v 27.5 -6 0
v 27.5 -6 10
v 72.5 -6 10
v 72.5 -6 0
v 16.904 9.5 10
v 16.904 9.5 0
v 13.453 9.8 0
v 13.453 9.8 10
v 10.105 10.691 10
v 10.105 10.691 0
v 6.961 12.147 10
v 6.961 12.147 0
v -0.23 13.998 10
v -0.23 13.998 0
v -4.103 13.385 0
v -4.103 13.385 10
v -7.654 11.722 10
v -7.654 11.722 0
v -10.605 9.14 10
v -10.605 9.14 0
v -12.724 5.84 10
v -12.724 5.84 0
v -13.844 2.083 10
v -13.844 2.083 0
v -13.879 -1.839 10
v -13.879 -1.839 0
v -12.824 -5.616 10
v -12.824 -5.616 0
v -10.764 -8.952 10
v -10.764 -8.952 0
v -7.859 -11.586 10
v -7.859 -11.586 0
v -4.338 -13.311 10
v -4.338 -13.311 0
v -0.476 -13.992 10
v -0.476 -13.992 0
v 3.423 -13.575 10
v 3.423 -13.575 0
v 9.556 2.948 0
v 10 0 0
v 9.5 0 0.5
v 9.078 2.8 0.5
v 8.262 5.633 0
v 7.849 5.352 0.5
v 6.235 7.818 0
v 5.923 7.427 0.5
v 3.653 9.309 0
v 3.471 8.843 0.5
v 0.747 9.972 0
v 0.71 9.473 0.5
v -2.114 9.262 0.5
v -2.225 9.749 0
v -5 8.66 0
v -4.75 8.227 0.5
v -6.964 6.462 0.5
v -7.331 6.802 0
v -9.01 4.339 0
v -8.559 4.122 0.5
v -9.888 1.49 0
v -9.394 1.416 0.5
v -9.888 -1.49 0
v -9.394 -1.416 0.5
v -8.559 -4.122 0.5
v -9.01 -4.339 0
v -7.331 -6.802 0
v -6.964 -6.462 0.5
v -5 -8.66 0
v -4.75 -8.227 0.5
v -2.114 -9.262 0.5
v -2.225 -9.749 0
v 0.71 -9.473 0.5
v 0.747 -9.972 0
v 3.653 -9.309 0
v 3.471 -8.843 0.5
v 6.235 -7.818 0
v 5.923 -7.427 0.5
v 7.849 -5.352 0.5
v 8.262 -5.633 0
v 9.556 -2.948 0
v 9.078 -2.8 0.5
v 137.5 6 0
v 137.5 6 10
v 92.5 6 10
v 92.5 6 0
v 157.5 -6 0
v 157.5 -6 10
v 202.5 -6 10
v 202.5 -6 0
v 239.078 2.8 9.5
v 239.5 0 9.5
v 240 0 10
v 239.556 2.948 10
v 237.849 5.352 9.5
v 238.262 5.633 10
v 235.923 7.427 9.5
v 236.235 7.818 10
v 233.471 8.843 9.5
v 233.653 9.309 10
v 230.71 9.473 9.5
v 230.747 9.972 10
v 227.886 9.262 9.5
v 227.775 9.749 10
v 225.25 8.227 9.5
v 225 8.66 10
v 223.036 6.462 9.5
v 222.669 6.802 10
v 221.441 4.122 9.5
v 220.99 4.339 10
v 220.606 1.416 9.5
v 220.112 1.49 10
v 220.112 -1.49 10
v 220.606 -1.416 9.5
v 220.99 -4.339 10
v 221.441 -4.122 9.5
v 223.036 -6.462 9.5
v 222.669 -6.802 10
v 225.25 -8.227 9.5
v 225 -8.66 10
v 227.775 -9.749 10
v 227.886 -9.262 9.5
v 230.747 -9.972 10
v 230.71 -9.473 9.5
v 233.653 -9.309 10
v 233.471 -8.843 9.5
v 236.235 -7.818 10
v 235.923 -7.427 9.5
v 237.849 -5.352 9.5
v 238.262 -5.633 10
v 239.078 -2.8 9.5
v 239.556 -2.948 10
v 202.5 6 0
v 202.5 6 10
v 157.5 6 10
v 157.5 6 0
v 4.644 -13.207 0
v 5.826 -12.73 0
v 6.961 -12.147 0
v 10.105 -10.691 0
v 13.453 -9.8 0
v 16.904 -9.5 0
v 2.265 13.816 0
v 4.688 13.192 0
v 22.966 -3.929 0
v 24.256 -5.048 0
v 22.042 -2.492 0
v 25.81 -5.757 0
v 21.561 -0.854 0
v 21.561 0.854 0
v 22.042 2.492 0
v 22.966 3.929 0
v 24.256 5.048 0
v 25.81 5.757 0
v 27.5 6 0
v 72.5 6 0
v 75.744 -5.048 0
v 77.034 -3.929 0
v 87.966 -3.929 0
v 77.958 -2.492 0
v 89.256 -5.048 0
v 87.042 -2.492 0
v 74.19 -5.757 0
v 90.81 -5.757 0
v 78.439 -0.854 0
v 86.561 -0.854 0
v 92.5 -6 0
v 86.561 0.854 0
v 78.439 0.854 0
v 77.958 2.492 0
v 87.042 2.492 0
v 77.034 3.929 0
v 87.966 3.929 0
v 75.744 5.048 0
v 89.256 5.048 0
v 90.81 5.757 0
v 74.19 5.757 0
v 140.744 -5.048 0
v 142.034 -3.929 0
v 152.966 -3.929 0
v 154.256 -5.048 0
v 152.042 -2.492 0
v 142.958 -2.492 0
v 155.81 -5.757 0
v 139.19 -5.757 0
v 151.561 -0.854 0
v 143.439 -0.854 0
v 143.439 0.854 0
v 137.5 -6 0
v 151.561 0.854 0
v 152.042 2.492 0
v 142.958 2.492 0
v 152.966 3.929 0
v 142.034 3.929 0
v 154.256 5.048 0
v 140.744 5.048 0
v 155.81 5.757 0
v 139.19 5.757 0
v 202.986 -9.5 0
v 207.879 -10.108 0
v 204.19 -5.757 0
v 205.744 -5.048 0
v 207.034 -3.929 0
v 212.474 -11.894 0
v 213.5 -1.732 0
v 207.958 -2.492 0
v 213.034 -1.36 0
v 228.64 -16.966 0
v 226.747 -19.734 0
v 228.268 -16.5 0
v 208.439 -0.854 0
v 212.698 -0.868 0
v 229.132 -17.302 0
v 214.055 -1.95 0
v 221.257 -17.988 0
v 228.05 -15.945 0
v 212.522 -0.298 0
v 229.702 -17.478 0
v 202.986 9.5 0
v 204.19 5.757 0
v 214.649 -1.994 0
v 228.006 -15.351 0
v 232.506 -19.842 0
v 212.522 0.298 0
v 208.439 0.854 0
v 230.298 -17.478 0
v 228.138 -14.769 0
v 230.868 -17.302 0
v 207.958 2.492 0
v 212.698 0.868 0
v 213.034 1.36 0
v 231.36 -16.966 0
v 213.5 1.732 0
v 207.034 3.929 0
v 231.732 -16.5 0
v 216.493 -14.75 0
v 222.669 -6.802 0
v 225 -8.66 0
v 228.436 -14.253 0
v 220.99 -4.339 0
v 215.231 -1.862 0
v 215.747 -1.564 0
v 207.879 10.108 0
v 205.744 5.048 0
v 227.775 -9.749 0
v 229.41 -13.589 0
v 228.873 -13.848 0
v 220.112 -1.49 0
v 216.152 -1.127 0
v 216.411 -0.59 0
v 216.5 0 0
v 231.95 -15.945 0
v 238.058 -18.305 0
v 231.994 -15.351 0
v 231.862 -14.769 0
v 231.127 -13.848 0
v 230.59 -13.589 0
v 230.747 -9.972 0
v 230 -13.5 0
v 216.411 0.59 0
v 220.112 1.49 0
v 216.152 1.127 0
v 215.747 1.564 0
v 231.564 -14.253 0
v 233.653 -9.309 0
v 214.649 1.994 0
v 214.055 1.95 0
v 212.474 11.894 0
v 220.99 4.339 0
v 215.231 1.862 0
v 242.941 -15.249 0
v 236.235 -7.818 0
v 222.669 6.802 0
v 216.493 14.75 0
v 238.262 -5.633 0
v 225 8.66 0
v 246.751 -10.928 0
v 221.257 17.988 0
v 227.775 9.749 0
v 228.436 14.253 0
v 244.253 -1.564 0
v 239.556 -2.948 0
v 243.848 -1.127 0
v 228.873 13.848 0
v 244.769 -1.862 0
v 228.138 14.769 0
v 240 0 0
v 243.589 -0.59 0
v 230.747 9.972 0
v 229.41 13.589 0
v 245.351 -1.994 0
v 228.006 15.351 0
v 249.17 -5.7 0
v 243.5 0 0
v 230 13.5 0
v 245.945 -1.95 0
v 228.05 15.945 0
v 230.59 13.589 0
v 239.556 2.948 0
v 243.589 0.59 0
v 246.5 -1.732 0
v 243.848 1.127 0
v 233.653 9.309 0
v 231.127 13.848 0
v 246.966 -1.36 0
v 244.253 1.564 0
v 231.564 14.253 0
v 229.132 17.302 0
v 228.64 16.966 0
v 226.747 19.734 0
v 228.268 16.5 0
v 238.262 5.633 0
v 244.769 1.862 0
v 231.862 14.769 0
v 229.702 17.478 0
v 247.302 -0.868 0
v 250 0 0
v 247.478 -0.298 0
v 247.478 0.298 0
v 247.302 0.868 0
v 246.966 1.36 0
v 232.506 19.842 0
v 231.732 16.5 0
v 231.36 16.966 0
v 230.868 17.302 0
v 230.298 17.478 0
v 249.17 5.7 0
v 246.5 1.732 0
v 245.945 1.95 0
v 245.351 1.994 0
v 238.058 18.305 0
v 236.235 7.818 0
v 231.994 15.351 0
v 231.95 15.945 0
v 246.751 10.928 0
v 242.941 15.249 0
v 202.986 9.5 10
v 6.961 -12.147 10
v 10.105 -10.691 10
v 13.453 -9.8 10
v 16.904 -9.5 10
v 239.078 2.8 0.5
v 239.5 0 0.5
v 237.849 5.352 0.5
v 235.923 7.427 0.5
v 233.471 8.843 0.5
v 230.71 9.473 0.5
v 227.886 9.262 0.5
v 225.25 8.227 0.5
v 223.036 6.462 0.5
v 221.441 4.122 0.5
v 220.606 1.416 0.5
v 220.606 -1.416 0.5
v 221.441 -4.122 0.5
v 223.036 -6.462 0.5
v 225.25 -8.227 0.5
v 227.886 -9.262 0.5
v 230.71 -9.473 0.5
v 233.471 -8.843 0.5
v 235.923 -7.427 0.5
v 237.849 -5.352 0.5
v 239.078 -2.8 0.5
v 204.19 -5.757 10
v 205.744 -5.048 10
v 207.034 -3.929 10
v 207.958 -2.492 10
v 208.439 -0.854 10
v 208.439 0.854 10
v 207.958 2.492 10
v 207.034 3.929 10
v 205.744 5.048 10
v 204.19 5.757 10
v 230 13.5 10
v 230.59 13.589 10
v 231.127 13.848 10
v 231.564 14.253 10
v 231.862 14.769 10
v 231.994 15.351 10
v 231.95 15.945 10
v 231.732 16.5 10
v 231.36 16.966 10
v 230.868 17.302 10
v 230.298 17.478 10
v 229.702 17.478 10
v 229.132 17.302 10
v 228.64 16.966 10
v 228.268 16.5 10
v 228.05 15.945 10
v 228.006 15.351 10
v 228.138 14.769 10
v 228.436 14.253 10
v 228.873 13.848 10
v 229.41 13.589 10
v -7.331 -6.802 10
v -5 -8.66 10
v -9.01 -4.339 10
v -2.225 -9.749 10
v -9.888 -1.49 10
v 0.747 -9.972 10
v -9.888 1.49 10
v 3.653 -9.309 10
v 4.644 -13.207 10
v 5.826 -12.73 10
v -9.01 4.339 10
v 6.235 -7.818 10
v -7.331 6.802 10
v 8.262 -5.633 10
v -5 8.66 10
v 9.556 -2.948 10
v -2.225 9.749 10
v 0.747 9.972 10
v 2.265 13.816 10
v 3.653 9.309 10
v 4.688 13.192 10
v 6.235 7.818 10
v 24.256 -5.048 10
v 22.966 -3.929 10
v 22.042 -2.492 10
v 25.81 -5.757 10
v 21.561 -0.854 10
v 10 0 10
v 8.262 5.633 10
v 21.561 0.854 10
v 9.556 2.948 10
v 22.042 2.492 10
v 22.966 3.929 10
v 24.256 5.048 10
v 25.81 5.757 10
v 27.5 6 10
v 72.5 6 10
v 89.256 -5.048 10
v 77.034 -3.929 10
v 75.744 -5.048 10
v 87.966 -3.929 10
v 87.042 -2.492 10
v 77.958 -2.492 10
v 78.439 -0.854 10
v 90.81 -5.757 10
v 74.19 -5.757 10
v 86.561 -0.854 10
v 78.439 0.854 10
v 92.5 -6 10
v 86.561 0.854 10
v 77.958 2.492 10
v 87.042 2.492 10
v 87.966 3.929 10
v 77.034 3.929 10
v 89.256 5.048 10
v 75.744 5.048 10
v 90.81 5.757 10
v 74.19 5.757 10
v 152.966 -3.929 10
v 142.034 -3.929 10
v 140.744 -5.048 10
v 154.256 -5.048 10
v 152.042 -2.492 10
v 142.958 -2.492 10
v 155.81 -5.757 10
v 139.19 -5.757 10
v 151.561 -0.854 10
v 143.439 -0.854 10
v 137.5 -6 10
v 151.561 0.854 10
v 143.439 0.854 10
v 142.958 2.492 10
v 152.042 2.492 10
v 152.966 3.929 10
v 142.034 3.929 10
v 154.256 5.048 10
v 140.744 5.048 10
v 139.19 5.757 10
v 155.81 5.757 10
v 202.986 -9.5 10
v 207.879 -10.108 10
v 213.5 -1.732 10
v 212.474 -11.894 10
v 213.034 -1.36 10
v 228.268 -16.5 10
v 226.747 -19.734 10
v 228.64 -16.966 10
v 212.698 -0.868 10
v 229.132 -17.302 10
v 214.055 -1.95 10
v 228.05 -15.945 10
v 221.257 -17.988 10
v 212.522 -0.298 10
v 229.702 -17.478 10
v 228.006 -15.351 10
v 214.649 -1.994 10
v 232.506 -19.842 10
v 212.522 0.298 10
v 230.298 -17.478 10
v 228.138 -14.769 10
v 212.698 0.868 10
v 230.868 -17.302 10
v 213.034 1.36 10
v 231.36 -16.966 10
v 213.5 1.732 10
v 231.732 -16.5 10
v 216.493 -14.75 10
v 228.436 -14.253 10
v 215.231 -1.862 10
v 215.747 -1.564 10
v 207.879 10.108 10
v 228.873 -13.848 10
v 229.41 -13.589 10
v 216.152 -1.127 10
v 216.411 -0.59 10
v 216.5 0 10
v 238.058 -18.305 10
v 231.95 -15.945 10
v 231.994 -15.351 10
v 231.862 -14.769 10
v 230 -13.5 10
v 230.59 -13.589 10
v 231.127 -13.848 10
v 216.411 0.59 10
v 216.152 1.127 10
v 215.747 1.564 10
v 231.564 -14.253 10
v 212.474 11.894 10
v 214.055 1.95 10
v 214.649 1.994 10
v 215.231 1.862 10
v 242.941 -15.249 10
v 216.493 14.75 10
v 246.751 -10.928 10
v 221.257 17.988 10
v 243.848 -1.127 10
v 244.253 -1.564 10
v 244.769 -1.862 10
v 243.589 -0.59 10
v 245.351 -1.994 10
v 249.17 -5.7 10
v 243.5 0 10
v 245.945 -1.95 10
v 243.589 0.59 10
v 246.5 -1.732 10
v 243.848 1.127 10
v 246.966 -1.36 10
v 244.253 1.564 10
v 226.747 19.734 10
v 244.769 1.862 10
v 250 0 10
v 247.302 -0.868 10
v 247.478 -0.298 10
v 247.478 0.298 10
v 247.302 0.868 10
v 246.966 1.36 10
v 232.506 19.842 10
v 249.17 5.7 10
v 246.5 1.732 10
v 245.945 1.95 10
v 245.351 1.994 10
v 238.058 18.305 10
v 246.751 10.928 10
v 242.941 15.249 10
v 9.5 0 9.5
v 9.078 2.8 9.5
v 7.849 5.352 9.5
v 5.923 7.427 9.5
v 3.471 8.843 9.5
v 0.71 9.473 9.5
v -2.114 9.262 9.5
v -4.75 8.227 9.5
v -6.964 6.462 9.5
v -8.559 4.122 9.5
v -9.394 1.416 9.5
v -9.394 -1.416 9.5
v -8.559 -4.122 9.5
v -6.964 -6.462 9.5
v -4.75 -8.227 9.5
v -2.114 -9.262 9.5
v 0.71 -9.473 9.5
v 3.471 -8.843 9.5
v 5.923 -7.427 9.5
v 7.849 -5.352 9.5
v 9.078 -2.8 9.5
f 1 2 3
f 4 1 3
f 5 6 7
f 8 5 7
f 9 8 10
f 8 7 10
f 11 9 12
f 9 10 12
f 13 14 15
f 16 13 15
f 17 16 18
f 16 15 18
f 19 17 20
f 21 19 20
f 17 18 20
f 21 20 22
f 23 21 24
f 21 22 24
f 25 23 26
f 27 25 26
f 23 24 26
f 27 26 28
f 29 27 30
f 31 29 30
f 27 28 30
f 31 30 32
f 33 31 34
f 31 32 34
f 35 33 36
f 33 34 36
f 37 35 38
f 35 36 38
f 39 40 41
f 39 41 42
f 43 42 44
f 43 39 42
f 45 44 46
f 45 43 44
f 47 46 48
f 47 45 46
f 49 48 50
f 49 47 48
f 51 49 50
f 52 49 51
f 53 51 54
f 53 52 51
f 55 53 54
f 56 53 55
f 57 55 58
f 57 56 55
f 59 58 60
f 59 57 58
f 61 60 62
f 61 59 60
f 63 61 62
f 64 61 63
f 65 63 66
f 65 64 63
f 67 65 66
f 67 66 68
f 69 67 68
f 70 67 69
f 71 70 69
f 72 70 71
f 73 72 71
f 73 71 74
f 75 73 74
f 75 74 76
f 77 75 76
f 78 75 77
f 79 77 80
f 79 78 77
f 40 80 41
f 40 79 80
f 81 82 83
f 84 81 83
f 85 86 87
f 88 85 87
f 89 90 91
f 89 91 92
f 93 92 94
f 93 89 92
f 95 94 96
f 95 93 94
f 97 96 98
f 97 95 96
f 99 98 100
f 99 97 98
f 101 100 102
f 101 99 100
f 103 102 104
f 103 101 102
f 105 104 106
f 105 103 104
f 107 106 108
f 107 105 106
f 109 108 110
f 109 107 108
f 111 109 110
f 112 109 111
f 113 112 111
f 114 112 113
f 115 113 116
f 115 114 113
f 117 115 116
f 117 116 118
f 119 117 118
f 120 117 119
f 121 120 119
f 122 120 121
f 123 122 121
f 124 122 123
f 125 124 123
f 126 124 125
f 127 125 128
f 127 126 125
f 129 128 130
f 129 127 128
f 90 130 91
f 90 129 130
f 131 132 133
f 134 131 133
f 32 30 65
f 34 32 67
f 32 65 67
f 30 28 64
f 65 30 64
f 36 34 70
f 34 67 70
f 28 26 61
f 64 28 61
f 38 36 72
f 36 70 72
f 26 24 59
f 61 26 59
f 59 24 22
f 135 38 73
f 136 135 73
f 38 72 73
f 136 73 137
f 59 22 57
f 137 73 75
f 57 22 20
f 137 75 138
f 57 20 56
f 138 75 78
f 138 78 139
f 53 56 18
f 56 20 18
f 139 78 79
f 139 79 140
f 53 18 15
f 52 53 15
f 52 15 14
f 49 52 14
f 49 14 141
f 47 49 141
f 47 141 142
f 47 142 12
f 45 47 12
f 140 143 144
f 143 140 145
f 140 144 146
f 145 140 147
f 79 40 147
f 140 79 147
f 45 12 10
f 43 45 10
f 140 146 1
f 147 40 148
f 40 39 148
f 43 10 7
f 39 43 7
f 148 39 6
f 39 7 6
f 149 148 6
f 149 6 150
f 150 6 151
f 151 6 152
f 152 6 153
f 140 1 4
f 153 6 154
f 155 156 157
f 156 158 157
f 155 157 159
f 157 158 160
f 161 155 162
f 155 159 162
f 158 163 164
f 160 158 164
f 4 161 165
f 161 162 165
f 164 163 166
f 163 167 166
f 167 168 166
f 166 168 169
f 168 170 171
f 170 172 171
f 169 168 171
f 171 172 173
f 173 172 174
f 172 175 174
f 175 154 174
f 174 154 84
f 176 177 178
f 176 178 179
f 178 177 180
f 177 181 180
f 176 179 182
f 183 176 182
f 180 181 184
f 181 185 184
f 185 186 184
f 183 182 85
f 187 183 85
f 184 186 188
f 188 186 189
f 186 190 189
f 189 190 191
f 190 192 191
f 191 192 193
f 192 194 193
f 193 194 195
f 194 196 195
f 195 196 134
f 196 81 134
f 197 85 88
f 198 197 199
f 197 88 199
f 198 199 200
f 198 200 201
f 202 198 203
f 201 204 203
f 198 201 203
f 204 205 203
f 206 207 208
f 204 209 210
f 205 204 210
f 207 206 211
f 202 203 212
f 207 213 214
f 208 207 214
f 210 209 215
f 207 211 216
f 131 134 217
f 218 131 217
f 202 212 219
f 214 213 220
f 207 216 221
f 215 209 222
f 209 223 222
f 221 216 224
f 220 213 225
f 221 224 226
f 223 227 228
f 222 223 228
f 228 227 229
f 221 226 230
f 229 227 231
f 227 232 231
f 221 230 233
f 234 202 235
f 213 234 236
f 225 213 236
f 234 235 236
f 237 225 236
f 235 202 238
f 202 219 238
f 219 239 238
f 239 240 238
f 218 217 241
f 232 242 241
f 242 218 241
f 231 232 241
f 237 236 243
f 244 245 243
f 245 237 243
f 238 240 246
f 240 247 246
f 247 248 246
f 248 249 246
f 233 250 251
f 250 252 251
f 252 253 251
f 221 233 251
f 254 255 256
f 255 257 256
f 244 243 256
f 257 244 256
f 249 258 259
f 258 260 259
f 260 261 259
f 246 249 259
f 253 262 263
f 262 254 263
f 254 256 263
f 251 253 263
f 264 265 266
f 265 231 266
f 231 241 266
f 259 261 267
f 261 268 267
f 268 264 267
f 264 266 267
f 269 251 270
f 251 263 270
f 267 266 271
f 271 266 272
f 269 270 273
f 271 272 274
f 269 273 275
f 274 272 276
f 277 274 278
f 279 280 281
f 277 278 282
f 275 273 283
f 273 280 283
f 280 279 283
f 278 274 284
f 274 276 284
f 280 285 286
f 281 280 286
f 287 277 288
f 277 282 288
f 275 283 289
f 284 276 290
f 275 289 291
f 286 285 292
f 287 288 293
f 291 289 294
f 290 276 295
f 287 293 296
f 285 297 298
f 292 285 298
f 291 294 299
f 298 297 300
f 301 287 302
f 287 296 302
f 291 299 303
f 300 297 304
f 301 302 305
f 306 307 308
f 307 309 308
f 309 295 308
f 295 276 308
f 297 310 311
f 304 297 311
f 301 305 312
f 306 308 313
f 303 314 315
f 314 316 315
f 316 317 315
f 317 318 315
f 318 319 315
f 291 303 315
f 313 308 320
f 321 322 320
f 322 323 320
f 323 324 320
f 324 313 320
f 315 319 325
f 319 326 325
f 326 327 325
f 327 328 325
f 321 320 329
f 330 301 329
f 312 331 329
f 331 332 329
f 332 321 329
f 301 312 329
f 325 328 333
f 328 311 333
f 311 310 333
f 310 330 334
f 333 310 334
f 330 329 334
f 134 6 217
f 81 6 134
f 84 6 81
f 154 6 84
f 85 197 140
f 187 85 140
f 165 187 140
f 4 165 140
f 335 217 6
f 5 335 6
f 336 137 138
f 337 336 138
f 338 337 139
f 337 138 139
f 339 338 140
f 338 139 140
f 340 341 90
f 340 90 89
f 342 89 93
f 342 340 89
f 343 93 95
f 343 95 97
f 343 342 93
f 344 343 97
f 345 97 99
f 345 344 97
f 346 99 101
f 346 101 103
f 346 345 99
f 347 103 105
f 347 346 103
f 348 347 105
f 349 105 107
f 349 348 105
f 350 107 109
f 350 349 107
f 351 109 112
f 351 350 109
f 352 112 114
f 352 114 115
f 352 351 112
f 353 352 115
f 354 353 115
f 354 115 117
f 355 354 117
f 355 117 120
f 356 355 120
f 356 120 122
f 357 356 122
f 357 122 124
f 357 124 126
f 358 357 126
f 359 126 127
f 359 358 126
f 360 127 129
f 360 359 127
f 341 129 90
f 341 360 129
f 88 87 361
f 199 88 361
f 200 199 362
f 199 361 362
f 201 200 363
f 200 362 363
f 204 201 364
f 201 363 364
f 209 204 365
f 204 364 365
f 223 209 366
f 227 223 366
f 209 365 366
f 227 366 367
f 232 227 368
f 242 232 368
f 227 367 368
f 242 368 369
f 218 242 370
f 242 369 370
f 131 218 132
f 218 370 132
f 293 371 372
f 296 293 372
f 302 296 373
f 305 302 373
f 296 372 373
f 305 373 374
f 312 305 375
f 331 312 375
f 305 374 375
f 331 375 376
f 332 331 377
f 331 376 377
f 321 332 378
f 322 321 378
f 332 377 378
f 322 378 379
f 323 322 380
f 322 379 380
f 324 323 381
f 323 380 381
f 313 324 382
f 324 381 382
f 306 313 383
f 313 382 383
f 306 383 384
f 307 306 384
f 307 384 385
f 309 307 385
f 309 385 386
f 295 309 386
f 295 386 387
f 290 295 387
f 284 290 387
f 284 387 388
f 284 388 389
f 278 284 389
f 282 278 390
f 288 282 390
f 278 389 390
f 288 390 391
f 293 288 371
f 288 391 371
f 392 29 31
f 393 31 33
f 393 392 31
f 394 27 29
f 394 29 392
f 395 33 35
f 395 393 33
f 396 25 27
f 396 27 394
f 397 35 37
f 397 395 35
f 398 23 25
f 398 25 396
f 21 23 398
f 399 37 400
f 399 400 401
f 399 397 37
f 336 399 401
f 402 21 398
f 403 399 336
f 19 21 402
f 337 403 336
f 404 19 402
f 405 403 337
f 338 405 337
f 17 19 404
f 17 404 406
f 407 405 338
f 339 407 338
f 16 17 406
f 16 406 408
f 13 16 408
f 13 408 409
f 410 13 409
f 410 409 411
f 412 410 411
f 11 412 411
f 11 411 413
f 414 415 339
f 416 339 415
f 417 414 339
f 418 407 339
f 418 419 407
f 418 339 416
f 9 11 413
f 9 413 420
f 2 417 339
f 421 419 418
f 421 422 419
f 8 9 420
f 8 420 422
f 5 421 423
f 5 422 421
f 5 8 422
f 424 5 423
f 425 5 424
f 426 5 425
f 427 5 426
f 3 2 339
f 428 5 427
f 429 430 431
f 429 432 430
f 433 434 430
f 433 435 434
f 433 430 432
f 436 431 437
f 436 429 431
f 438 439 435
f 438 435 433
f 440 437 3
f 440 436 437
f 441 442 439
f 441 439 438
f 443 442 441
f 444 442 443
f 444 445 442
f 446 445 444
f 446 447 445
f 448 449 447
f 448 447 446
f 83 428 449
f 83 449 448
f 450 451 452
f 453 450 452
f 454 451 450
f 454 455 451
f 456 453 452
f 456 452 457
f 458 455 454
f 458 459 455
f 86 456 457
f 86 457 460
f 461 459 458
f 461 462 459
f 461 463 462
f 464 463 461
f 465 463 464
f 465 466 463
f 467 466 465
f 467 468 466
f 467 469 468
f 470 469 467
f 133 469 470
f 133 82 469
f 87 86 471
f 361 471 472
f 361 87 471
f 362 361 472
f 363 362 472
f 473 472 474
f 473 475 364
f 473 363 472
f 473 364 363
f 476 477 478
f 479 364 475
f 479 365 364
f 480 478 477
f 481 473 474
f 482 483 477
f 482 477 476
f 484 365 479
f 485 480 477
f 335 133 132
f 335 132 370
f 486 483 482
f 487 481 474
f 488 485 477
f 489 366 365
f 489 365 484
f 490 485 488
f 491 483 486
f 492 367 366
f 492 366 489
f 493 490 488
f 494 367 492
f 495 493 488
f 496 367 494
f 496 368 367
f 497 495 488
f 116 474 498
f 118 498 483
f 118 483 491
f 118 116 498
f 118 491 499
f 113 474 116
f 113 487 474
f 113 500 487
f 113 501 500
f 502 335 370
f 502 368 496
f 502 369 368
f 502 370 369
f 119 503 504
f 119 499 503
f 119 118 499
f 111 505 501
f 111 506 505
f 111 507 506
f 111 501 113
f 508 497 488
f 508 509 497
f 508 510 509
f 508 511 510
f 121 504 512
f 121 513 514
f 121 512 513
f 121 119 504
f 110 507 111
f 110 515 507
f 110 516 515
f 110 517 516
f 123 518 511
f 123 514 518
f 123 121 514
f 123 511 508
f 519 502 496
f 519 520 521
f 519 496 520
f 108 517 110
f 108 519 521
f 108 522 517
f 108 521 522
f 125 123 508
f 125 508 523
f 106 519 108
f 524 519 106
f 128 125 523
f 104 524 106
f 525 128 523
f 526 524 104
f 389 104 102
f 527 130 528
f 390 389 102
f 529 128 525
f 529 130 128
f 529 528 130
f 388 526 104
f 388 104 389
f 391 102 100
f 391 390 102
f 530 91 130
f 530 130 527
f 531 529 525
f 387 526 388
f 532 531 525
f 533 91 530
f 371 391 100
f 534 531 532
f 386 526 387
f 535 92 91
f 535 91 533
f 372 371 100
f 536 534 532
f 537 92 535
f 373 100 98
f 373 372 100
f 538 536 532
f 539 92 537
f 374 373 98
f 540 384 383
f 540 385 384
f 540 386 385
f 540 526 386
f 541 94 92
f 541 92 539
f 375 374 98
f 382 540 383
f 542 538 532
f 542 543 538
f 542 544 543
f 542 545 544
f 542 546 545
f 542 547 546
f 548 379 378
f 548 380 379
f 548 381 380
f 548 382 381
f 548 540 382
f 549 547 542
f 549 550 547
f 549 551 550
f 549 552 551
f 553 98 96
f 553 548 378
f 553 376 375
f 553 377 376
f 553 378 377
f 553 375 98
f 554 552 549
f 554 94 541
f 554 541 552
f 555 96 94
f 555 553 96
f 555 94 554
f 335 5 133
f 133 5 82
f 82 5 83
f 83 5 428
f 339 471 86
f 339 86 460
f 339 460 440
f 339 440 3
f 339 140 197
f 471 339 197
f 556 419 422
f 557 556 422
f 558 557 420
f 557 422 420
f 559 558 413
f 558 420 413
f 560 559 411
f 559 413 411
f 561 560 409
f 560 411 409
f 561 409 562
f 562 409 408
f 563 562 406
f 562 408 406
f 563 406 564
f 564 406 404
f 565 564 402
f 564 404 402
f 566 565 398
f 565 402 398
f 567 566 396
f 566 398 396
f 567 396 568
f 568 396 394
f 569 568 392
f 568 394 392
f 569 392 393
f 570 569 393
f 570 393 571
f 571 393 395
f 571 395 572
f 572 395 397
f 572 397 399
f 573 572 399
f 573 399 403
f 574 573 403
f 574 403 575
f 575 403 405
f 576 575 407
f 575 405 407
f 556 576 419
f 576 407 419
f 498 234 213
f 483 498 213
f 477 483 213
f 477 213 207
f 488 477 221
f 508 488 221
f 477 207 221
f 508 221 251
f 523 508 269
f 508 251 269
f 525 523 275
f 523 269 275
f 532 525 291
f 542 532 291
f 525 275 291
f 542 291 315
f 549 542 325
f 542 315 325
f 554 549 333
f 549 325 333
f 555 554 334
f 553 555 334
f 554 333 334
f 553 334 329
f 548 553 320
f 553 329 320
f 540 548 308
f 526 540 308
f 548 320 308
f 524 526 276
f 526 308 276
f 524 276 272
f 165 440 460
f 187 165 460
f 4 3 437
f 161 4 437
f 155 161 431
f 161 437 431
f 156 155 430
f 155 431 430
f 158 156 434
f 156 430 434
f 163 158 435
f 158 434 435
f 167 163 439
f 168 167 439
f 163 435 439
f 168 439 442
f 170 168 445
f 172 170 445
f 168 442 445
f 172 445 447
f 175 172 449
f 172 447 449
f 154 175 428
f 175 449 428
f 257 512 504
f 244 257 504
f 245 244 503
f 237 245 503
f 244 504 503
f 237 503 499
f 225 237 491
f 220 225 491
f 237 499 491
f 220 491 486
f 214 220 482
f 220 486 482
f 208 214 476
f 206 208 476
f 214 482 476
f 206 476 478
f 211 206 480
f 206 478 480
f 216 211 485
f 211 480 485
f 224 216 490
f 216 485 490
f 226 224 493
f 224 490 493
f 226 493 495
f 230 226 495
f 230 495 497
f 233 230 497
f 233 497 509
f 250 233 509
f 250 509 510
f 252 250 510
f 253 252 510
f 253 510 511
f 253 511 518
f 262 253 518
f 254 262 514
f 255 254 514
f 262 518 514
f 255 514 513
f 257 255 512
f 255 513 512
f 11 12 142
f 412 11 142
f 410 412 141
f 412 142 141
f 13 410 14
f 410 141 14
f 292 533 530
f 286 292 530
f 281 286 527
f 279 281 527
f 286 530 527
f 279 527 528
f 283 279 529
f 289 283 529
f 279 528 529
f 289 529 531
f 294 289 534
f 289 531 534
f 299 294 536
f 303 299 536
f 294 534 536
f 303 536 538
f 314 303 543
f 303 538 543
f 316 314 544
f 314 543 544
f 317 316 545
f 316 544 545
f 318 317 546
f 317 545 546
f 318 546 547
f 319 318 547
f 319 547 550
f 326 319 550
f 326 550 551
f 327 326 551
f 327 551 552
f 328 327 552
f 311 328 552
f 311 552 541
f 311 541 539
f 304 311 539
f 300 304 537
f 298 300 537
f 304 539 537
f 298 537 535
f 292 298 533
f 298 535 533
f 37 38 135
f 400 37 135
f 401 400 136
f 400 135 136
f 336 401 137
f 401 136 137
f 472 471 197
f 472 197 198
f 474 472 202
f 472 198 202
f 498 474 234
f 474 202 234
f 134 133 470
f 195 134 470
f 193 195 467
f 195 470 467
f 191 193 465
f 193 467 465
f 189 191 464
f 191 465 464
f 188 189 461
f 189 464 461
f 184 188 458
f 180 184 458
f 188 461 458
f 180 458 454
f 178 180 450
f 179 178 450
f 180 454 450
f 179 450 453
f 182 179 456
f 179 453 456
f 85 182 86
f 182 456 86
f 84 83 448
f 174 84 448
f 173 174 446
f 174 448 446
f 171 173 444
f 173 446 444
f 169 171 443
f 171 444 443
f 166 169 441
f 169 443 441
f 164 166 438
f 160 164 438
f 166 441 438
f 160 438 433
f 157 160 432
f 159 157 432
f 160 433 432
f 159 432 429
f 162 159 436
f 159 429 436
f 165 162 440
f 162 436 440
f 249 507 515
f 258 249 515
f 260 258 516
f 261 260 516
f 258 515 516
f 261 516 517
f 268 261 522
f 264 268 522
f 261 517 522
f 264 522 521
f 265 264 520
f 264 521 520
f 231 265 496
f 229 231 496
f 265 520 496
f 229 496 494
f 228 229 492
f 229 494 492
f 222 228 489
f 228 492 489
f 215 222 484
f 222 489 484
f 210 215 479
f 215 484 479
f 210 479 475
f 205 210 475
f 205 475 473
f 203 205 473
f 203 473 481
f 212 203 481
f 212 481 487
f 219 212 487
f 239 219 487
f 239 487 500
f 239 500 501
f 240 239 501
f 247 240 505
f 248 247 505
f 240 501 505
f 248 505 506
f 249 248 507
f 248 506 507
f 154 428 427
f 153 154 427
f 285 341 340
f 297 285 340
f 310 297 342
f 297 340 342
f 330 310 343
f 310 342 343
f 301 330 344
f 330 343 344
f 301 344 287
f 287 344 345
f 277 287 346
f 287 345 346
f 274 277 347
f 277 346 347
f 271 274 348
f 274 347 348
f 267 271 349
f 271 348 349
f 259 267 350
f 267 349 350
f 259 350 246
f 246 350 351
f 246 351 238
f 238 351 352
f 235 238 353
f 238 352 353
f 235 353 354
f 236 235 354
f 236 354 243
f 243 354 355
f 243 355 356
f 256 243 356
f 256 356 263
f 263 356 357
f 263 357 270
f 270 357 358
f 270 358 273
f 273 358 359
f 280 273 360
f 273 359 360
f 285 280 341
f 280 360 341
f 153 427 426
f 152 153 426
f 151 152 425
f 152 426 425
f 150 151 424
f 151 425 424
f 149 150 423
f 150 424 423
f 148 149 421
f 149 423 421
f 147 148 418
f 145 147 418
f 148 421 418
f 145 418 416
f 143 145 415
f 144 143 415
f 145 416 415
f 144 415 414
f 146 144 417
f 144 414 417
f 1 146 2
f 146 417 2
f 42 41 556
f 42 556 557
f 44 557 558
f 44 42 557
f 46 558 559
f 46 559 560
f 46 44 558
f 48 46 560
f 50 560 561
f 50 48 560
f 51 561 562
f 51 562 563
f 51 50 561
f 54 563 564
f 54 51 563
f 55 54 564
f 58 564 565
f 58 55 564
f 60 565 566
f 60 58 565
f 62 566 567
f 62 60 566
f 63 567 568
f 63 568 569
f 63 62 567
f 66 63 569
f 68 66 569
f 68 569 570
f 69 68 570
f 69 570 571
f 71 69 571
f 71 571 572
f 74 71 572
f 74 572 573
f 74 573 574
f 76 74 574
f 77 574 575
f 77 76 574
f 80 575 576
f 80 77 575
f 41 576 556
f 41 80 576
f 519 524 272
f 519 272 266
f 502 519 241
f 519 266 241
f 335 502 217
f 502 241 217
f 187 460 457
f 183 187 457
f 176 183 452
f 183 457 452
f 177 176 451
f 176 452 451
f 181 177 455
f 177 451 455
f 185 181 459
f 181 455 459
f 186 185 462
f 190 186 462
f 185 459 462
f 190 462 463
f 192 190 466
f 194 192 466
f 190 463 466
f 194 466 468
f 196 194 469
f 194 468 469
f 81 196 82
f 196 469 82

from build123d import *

# Parameters (mm, degrees)
SKETCH_1_R               = 9.5
EXTRUDE_2_DEPTH          = 10
CHAMFER_1_SIZE           = 0.5
CUT_EXTRUDE_1_DEPTH      = 10
SKETCH_3_R               = 2
CUT_EXTRUDE_2_DEPTH      = 10
CHAMFER_2_SIZE           = 0.5
SKETCH_5_R               = 2
CUT_EXTRUDE_3_DEPTH      = 10
CHAMFER_3_SIZE           = 0.5
SKETCH_9_R               = 2
EXTRUDE_3_DEPTH          = 10
CUT_EXTRUDE_6_DEPTH      = 10
PATTERN_CIRCULAR_2_COUNT = 4


with BuildPart() as part:
    # 草图1 → 凸台-拉伸2 (new body)
    with BuildSketch(Plane.XY):
        with BuildLine():
            Line((20.821645942, -9.5), (202.986114682, -9.5))
            ThreePointArc((202.986114682, -9.5), (210.231803055, -10.858648118), (216.493057341, -14.75))
            ThreePointArc((216.493057341, -14.75), (250, 0), (216.493057341, 14.75))
            ThreePointArc((216.493057341, 14.75), (210.231803055, 10.858648118), (202.986114682, 9.5))
            Line((202.986114682, 9.5), (21.63860854, 9.5))
            Line((21.63860854, 9.5), (16.904141504, 9.5))
            ThreePointArc((16.904141504, 9.5), (11.75918395, 10.173090993), (6.960528855, 12.147058824))
            ThreePointArc((6.960528855, 12.147058824), (3.490452231, 13.557903349), (-0.229510749, 13.998118617))
            ThreePointArc((-0.229510749, 13.998118617), (-13.878745314, -1.838594167), (3.423256182, -13.575025492))
            ThreePointArc((3.423256182, -13.575025492), (5.240755683, -12.982083033), (6.960528855, -12.147058824))
            ThreePointArc((6.960528855, -12.147058824), (11.75918395, -10.173090993), (16.904141504, -9.5))
            Line((16.904141504, -9.5), (20.821645942, -9.5))
        make_face()
        Circle(SKETCH_1_R, mode=Mode.SUBTRACT)
        with Locations((230, 0)):
            Circle(SKETCH_1_R, mode=Mode.SUBTRACT)
    extrude(amount=EXTRUDE_2_DEPTH)

    # 倒角1
    chamfer_1_edges = [part.edges().sort_by_distance(p)[0] for p in [
        (-9.5, 0, 10),
        (-9.5, 0, 0),
    ]]
    chamfer(chamfer_1_edges, length=CHAMFER_1_SIZE)

    # 草图2 → 切除-拉伸1 (cut)
    with BuildSketch(Plane.XY.offset(10)):
        with BuildLine():
            Line((92.5, -6), (137.5, -6))
            ThreePointArc((137.5, -6), (143.5, 0), (137.5, 6))
            Line((137.5, 6), (92.5, 6))
            ThreePointArc((92.5, 6), (86.5, 0), (92.5, -6))
        make_face()
        with BuildLine():
            Line((157.5, -6), (202.5, -6))
            ThreePointArc((202.5, -6), (208.5, 0), (202.5, 6))
            Line((202.5, 6), (157.5, 6))
            ThreePointArc((157.5, 6), (151.5, 0), (157.5, -6))
        make_face()
        with BuildLine():
            Line((27.5, -6), (72.5, -6))
            ThreePointArc((72.5, -6), (78.5, 0), (72.5, 6))
            Line((72.5, 6), (27.5, 6))
            ThreePointArc((27.5, 6), (21.5, 0), (27.5, -6))
        make_face()
    extrude(amount=-CUT_EXTRUDE_1_DEPTH, mode=Mode.SUBTRACT)

    # 草图3 → 切除-拉伸2 (cut)
    with BuildSketch(Plane.XY.offset(10)):
        with Locations((222.5, 12.990381057)):
            Circle(SKETCH_3_R)
        with Locations((237.5, 12.990381057)):
            Circle(SKETCH_3_R)
        with Locations((245, 0)):
            Circle(SKETCH_3_R)
    extrude(amount=-CUT_EXTRUDE_2_DEPTH, mode=Mode.SUBTRACT)

    # 倒角2
    chamfer_2_edges = [part.edges().sort_by_distance(p)[0] for p in [
        (220.5, 0, 10),
    ]]
    chamfer(chamfer_2_edges, length=CHAMFER_2_SIZE)

    # 草图5 → 切除-拉伸3 (cut)
    with BuildSketch(Plane.XY.offset(10)):
        with Locations((215, 0)):
            Circle(SKETCH_5_R)
        with Locations((222.5, -12.990381057)):
            Circle(SKETCH_5_R)
        with Locations((237.5, -12.990381057)):
            Circle(SKETCH_5_R)
    extrude(amount=-CUT_EXTRUDE_3_DEPTH, mode=Mode.SUBTRACT)

    # 倒角3
    chamfer_3_edges = [part.edges().sort_by_distance(p)[0] for p in [
        (220.5, 0, 0),
    ]]
    chamfer(chamfer_3_edges, length=CHAMFER_3_SIZE)

    # 草图9 → 凸台-拉伸3 (add)
    with BuildSketch(Plane.XY.offset(10)):
        with Locations((215, 0)):
            Circle(SKETCH_9_R)
        with Locations((222.5, 12.990381057)):
            Circle(SKETCH_9_R)
        with Locations((237.5, 12.990381057)):
            Circle(SKETCH_9_R)
        with Locations((245, 0)):
            Circle(SKETCH_9_R)
        with Locations((237.5, -12.990381057)):
            Circle(SKETCH_9_R)
        with Locations((222.5, -12.990381057)):
            Circle(SKETCH_9_R)
    extrude(amount=-EXTRUDE_3_DEPTH)

    # 草图10 → 切除-拉伸6 (cut)
    with BuildSketch(Plane.XY.offset(10)):
        with BuildLine():
            ThreePointArc((214.629032258, -1.995833329), (215.959120371, -1.367833229), (216.5, 0))
            ThreePointArc((216.5, 0), (215.959120371, 1.367833229), (214.629032258, 1.995833329))
            ThreePointArc((214.629032258, 1.995833329), (212.5, 0), (214.629032258, -1.995833329))
        make_face()
    cut_extrude_6 = extrude(amount=-CUT_EXTRUDE_6_DEPTH, mode=Mode.SUBTRACT)

    # 阵列(圆周)2: 切除-拉伸6 ×4 about axis
    pattern_circular_2_axis = Axis((230, 0, 9.5), (0, 0, -1))
    for i in range(1, PATTERN_CIRCULAR_2_COUNT):
        add(cut_extrude_6.rotate(pattern_circular_2_axis, i * 360 / PATTERN_CIRCULAR_2_COUNT), mode=Mode.SUBTRACT)


solid = part.part
